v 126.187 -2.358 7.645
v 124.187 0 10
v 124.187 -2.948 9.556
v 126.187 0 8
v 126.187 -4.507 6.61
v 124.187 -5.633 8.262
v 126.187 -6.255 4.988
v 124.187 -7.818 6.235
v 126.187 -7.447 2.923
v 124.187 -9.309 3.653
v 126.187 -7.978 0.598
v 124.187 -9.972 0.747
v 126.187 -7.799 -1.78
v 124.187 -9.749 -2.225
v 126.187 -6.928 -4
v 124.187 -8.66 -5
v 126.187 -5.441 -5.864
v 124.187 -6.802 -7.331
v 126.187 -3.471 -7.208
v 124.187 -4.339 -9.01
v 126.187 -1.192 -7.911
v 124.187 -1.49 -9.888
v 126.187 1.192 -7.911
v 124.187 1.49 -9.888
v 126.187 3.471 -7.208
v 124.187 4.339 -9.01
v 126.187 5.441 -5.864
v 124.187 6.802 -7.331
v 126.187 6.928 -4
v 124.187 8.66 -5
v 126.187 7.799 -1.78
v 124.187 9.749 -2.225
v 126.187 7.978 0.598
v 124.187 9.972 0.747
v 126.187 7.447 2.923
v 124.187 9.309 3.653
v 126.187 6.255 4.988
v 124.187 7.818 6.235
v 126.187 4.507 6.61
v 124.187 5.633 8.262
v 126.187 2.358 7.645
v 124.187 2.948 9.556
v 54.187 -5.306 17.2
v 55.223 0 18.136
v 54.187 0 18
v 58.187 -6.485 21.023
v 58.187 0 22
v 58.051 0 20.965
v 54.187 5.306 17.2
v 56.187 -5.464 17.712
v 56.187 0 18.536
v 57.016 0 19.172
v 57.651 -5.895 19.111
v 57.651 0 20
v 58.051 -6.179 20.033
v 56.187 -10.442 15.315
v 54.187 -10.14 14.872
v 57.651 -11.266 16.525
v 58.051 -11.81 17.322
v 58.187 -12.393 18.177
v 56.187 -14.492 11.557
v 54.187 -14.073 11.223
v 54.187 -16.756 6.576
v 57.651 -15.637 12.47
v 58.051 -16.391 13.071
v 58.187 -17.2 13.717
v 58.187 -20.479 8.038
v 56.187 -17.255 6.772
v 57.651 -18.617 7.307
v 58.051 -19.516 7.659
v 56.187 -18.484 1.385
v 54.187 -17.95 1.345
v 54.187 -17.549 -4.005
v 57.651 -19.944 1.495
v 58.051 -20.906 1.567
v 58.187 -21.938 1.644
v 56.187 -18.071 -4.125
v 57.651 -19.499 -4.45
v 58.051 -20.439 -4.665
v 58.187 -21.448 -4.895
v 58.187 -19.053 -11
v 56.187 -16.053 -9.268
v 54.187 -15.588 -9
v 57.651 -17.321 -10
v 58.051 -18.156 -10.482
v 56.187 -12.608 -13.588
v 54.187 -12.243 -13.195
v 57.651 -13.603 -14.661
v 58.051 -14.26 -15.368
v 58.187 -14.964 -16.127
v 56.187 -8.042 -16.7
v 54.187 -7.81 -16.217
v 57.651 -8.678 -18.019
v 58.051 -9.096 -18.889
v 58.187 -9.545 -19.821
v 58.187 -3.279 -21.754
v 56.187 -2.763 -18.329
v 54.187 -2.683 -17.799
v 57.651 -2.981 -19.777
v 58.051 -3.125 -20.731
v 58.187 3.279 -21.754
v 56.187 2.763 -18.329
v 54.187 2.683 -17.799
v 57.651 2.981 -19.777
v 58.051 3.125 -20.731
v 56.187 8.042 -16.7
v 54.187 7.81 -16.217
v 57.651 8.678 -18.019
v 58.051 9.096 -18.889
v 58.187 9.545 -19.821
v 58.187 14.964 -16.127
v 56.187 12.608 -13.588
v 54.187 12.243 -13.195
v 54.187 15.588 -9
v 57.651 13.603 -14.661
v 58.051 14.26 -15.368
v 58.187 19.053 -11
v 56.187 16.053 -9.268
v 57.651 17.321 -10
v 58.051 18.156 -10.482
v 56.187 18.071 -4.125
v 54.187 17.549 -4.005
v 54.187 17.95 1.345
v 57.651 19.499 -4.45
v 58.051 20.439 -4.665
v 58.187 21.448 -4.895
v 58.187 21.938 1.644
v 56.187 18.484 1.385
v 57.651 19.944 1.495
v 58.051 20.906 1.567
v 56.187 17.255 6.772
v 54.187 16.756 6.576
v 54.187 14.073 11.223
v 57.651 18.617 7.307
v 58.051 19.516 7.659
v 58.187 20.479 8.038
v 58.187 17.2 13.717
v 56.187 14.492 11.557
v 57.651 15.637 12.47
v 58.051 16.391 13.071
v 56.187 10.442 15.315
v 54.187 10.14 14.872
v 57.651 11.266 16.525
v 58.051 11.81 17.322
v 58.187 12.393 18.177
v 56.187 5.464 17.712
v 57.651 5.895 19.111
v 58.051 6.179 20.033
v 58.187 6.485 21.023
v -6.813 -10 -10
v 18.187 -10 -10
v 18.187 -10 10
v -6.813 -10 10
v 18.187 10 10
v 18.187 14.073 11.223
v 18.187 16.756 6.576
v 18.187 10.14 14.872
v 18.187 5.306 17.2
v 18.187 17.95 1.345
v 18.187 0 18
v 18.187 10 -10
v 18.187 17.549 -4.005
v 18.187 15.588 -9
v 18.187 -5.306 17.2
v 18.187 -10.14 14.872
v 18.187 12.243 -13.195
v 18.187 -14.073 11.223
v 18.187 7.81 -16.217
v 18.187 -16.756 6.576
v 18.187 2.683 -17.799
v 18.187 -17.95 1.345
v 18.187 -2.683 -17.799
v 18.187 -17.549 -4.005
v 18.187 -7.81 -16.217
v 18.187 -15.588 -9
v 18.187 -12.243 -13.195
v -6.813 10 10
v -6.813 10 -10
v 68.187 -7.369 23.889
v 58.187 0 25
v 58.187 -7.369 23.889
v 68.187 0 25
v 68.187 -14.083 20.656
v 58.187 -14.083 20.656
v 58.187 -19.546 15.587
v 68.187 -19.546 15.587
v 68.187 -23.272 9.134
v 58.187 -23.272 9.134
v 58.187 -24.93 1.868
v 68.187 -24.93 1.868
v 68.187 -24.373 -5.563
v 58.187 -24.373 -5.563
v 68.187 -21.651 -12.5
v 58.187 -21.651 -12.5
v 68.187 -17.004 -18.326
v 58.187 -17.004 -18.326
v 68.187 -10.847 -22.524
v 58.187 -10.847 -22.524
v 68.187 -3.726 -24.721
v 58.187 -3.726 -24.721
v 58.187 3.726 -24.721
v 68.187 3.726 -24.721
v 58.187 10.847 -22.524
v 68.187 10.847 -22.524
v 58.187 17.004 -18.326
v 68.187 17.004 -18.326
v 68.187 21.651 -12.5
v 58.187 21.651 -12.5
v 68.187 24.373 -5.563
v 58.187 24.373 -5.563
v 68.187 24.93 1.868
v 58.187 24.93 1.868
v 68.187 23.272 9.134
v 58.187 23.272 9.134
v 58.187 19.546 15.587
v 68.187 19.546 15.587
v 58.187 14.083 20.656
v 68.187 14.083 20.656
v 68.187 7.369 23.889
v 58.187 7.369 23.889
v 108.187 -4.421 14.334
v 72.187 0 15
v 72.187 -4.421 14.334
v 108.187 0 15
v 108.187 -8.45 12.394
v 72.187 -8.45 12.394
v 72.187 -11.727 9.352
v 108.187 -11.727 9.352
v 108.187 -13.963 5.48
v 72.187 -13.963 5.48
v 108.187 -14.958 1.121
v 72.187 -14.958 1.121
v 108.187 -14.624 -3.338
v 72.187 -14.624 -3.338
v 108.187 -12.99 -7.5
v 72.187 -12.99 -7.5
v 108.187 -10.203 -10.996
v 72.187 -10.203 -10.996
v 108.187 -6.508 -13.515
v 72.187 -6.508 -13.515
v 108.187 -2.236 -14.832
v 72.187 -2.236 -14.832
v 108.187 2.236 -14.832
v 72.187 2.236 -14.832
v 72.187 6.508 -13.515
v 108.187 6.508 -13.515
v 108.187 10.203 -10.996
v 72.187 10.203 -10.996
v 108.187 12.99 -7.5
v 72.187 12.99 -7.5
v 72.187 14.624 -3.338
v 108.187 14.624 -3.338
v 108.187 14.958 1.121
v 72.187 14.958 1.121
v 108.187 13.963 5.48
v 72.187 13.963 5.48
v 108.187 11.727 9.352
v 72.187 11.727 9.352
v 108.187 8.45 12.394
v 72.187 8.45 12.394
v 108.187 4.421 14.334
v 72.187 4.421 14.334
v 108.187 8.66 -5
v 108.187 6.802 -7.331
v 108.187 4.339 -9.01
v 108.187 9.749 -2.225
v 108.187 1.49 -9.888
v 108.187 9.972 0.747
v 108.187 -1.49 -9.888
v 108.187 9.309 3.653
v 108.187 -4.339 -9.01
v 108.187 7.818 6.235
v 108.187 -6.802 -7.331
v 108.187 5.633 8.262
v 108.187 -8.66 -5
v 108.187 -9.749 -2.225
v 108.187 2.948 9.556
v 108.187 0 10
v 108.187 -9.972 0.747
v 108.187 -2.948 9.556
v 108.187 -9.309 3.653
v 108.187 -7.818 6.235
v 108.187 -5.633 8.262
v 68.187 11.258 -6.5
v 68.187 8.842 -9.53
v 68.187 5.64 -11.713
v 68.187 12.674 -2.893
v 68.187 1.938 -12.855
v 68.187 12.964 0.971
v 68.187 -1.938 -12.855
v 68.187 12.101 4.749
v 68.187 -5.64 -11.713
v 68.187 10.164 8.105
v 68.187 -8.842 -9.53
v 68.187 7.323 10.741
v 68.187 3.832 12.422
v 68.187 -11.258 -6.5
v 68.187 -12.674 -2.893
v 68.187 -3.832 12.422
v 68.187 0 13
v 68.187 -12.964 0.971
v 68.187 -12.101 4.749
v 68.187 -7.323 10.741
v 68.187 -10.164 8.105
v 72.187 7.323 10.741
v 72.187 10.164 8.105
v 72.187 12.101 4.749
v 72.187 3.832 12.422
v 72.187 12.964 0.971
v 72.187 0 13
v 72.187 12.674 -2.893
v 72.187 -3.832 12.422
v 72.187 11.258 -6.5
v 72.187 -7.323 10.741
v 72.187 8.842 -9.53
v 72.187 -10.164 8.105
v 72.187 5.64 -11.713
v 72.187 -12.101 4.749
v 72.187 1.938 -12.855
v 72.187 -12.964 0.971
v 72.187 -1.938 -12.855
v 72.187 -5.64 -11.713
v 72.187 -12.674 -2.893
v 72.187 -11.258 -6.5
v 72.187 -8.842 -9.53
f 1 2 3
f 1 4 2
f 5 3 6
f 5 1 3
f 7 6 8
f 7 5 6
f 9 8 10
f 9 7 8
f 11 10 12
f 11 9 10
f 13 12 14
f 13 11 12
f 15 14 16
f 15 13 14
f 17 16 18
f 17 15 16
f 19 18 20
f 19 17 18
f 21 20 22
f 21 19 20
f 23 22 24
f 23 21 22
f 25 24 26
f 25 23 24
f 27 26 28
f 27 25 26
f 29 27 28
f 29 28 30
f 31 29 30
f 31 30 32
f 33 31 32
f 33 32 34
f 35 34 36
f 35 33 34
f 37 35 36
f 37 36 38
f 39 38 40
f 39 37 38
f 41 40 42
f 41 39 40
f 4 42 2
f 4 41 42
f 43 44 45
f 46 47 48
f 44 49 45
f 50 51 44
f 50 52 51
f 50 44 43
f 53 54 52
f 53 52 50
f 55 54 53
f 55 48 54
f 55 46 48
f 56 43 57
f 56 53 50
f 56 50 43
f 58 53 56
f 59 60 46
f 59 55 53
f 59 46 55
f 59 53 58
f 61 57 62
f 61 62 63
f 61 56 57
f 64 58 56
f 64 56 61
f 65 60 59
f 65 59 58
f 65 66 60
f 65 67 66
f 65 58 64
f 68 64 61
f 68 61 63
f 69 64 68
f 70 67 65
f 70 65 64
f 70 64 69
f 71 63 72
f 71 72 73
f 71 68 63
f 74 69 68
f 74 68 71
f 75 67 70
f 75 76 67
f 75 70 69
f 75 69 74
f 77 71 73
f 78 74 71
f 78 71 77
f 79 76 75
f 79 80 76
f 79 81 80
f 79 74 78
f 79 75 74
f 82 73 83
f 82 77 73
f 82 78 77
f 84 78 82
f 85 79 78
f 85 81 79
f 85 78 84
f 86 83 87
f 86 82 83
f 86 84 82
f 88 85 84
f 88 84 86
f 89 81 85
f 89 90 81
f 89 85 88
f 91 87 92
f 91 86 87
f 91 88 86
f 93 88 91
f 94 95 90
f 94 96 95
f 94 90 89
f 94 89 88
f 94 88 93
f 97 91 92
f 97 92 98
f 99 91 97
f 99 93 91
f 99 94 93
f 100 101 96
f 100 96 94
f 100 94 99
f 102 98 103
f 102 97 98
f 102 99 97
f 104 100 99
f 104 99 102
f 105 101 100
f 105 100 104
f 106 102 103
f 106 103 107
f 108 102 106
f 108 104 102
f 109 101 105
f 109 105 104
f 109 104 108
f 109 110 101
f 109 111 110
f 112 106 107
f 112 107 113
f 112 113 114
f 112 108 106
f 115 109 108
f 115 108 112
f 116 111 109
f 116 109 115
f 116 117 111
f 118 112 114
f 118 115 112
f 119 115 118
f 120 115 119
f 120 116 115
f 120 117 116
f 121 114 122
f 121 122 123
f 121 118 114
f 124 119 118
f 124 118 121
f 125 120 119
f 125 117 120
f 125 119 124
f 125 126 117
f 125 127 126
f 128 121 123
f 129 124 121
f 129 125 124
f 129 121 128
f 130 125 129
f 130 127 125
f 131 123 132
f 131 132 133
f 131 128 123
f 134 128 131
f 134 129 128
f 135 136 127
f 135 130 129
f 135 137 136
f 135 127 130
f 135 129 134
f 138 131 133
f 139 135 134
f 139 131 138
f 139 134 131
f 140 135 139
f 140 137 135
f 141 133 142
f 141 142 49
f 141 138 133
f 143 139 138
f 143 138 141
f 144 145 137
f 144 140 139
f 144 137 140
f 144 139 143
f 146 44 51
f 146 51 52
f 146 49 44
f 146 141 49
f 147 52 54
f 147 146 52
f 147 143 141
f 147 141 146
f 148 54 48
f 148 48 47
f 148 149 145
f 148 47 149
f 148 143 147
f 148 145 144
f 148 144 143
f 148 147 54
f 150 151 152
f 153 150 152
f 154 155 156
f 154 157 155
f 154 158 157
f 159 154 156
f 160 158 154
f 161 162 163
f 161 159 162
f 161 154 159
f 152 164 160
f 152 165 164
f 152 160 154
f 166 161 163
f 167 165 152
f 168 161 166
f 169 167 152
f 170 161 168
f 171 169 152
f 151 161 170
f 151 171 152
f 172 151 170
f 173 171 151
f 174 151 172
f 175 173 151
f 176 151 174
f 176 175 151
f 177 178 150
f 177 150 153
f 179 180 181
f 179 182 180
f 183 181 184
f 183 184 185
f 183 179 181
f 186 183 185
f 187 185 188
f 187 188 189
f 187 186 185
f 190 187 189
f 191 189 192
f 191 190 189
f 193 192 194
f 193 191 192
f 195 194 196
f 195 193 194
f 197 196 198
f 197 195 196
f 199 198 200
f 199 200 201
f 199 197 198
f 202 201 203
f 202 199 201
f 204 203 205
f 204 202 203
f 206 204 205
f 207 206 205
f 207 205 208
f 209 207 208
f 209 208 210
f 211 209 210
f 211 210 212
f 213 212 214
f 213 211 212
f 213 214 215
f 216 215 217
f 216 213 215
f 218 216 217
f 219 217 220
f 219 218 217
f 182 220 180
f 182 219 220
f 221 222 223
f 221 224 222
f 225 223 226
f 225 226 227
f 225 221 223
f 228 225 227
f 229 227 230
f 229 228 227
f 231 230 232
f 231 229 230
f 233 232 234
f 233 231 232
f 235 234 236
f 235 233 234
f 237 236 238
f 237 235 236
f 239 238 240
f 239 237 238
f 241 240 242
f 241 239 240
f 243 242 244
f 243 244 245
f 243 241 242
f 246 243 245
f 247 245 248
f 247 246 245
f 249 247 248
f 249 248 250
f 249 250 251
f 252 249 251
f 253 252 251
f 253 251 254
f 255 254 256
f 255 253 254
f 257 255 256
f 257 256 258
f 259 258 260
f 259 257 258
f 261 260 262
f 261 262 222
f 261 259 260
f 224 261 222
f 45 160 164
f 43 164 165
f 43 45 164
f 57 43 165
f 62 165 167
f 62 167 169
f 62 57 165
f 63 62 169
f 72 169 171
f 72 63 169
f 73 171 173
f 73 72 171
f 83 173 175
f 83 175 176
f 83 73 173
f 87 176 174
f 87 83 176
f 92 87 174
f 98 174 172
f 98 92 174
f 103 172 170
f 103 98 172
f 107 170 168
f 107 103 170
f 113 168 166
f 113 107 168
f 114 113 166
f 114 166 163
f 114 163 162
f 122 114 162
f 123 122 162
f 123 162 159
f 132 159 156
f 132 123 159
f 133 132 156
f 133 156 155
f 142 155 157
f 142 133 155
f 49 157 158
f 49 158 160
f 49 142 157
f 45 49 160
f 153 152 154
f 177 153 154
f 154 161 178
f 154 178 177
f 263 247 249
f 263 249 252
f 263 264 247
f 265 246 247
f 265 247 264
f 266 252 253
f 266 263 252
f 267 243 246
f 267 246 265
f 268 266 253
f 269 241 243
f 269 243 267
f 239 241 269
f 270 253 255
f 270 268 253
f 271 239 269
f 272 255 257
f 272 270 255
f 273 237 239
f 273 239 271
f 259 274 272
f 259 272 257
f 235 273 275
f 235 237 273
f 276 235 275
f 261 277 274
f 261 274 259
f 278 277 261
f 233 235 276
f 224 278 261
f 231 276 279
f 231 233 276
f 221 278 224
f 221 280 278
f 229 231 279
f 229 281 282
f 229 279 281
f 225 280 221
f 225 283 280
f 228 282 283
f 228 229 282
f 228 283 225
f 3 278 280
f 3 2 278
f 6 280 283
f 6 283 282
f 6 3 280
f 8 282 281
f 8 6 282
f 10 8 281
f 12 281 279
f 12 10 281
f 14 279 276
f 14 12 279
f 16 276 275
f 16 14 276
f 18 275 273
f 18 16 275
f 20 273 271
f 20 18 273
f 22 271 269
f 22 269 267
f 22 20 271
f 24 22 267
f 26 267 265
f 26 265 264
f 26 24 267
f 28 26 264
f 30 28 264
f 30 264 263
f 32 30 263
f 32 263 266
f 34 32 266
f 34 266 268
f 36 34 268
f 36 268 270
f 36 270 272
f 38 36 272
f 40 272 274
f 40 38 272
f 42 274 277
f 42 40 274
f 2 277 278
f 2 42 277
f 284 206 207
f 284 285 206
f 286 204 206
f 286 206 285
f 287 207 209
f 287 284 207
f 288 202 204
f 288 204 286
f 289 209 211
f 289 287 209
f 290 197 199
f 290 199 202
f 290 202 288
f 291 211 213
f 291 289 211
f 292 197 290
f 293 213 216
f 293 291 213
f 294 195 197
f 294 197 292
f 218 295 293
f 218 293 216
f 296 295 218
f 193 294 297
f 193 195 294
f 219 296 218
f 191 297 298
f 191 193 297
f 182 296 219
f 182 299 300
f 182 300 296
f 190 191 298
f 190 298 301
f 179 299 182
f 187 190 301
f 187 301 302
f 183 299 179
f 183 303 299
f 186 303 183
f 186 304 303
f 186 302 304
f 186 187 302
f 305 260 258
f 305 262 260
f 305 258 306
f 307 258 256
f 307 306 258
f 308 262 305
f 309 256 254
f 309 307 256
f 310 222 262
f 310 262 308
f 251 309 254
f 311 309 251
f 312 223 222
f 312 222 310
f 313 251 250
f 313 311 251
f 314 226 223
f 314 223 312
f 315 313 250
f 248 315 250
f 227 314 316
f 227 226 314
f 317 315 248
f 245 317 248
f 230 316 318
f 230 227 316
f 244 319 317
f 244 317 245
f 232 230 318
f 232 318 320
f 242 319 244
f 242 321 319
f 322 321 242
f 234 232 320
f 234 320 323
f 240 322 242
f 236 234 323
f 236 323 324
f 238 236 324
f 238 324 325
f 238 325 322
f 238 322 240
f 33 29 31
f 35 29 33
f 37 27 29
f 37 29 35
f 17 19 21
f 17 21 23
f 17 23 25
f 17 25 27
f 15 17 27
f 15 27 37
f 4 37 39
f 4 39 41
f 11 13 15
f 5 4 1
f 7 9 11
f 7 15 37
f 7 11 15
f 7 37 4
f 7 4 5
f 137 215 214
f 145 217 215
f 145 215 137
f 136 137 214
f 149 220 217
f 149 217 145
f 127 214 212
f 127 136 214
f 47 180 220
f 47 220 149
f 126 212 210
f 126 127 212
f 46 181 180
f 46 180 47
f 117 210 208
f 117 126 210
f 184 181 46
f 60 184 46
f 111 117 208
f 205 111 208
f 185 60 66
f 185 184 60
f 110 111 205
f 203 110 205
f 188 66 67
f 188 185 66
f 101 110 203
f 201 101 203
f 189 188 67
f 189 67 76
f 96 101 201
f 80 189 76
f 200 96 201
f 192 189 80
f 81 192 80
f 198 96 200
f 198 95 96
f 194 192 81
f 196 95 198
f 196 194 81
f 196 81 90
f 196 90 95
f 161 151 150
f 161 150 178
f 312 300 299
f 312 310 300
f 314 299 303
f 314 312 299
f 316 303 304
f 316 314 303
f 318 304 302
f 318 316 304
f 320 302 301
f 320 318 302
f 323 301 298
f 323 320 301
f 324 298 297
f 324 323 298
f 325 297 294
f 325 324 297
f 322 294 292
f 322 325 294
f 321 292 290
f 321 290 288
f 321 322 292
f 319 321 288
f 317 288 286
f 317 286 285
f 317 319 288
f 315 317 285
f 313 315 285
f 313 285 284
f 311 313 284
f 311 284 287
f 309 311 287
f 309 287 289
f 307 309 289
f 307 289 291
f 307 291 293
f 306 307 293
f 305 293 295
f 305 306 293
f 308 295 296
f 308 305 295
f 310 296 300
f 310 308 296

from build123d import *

# Parameters (mm, degrees)
SKIZZE2_W                       = 20
SKIZZE2_H                       = 20
AUFSATZ_LINEAR_AUSTRAGEN1_DEPTH = 25


with BuildPart() as part:
    # Skizze1 → Rotation1 (revolve)
    with BuildSketch(Plane.XY, mode=Mode.PRIVATE) as rotation1_sk:
        with BuildLine():
            Line((18.187375951, 0), (18.187375951, -18))
            Line((18.187375951, -18), (54.187375951, -18))
            ThreePointArc((54.187375951, -18), (57.015803076, -19.171572875), (58.187375951, -22))
            Line((58.187375951, -22), (58.187375951, -25))
            Line((58.187375951, -25), (68.187375951, -25))
            Line((68.187375951, -25), (68.187375951, -13))
            Line((68.187375951, -13), (72.187375951, -13))
            Line((72.187375951, -13), (72.187375951, -15))
            Line((72.187375951, -15), (108.187375951, -15))
            Line((108.187375951, -15), (108.187375951, -10))
            Line((108.187375951, -10), (124.187375951, -10))
            Line((124.187375951, -10), (126.187375951, -8))
            Line((126.187375951, -8), (126.187375951, 0))
            Line((126.187375951, 0), (18.187375951, 0))
        make_face()
    revolve(rotation1_sk.sketch.rotate(Axis((0, 0, 0), (1, 0, 0)), 270), axis=Axis((0, 0, 0), (1, 0, 0)))

    # Skizze2 → Aufsatz-Linear austragen1 (add)
    with BuildSketch(Plane.ZY.offset(-18.187375951)):
        Rectangle(SKIZZE2_W, SKIZZE2_H)
    extrude(amount=AUFSATZ_LINEAR_AUSTRAGEN1_DEPTH)


solid = part.part
